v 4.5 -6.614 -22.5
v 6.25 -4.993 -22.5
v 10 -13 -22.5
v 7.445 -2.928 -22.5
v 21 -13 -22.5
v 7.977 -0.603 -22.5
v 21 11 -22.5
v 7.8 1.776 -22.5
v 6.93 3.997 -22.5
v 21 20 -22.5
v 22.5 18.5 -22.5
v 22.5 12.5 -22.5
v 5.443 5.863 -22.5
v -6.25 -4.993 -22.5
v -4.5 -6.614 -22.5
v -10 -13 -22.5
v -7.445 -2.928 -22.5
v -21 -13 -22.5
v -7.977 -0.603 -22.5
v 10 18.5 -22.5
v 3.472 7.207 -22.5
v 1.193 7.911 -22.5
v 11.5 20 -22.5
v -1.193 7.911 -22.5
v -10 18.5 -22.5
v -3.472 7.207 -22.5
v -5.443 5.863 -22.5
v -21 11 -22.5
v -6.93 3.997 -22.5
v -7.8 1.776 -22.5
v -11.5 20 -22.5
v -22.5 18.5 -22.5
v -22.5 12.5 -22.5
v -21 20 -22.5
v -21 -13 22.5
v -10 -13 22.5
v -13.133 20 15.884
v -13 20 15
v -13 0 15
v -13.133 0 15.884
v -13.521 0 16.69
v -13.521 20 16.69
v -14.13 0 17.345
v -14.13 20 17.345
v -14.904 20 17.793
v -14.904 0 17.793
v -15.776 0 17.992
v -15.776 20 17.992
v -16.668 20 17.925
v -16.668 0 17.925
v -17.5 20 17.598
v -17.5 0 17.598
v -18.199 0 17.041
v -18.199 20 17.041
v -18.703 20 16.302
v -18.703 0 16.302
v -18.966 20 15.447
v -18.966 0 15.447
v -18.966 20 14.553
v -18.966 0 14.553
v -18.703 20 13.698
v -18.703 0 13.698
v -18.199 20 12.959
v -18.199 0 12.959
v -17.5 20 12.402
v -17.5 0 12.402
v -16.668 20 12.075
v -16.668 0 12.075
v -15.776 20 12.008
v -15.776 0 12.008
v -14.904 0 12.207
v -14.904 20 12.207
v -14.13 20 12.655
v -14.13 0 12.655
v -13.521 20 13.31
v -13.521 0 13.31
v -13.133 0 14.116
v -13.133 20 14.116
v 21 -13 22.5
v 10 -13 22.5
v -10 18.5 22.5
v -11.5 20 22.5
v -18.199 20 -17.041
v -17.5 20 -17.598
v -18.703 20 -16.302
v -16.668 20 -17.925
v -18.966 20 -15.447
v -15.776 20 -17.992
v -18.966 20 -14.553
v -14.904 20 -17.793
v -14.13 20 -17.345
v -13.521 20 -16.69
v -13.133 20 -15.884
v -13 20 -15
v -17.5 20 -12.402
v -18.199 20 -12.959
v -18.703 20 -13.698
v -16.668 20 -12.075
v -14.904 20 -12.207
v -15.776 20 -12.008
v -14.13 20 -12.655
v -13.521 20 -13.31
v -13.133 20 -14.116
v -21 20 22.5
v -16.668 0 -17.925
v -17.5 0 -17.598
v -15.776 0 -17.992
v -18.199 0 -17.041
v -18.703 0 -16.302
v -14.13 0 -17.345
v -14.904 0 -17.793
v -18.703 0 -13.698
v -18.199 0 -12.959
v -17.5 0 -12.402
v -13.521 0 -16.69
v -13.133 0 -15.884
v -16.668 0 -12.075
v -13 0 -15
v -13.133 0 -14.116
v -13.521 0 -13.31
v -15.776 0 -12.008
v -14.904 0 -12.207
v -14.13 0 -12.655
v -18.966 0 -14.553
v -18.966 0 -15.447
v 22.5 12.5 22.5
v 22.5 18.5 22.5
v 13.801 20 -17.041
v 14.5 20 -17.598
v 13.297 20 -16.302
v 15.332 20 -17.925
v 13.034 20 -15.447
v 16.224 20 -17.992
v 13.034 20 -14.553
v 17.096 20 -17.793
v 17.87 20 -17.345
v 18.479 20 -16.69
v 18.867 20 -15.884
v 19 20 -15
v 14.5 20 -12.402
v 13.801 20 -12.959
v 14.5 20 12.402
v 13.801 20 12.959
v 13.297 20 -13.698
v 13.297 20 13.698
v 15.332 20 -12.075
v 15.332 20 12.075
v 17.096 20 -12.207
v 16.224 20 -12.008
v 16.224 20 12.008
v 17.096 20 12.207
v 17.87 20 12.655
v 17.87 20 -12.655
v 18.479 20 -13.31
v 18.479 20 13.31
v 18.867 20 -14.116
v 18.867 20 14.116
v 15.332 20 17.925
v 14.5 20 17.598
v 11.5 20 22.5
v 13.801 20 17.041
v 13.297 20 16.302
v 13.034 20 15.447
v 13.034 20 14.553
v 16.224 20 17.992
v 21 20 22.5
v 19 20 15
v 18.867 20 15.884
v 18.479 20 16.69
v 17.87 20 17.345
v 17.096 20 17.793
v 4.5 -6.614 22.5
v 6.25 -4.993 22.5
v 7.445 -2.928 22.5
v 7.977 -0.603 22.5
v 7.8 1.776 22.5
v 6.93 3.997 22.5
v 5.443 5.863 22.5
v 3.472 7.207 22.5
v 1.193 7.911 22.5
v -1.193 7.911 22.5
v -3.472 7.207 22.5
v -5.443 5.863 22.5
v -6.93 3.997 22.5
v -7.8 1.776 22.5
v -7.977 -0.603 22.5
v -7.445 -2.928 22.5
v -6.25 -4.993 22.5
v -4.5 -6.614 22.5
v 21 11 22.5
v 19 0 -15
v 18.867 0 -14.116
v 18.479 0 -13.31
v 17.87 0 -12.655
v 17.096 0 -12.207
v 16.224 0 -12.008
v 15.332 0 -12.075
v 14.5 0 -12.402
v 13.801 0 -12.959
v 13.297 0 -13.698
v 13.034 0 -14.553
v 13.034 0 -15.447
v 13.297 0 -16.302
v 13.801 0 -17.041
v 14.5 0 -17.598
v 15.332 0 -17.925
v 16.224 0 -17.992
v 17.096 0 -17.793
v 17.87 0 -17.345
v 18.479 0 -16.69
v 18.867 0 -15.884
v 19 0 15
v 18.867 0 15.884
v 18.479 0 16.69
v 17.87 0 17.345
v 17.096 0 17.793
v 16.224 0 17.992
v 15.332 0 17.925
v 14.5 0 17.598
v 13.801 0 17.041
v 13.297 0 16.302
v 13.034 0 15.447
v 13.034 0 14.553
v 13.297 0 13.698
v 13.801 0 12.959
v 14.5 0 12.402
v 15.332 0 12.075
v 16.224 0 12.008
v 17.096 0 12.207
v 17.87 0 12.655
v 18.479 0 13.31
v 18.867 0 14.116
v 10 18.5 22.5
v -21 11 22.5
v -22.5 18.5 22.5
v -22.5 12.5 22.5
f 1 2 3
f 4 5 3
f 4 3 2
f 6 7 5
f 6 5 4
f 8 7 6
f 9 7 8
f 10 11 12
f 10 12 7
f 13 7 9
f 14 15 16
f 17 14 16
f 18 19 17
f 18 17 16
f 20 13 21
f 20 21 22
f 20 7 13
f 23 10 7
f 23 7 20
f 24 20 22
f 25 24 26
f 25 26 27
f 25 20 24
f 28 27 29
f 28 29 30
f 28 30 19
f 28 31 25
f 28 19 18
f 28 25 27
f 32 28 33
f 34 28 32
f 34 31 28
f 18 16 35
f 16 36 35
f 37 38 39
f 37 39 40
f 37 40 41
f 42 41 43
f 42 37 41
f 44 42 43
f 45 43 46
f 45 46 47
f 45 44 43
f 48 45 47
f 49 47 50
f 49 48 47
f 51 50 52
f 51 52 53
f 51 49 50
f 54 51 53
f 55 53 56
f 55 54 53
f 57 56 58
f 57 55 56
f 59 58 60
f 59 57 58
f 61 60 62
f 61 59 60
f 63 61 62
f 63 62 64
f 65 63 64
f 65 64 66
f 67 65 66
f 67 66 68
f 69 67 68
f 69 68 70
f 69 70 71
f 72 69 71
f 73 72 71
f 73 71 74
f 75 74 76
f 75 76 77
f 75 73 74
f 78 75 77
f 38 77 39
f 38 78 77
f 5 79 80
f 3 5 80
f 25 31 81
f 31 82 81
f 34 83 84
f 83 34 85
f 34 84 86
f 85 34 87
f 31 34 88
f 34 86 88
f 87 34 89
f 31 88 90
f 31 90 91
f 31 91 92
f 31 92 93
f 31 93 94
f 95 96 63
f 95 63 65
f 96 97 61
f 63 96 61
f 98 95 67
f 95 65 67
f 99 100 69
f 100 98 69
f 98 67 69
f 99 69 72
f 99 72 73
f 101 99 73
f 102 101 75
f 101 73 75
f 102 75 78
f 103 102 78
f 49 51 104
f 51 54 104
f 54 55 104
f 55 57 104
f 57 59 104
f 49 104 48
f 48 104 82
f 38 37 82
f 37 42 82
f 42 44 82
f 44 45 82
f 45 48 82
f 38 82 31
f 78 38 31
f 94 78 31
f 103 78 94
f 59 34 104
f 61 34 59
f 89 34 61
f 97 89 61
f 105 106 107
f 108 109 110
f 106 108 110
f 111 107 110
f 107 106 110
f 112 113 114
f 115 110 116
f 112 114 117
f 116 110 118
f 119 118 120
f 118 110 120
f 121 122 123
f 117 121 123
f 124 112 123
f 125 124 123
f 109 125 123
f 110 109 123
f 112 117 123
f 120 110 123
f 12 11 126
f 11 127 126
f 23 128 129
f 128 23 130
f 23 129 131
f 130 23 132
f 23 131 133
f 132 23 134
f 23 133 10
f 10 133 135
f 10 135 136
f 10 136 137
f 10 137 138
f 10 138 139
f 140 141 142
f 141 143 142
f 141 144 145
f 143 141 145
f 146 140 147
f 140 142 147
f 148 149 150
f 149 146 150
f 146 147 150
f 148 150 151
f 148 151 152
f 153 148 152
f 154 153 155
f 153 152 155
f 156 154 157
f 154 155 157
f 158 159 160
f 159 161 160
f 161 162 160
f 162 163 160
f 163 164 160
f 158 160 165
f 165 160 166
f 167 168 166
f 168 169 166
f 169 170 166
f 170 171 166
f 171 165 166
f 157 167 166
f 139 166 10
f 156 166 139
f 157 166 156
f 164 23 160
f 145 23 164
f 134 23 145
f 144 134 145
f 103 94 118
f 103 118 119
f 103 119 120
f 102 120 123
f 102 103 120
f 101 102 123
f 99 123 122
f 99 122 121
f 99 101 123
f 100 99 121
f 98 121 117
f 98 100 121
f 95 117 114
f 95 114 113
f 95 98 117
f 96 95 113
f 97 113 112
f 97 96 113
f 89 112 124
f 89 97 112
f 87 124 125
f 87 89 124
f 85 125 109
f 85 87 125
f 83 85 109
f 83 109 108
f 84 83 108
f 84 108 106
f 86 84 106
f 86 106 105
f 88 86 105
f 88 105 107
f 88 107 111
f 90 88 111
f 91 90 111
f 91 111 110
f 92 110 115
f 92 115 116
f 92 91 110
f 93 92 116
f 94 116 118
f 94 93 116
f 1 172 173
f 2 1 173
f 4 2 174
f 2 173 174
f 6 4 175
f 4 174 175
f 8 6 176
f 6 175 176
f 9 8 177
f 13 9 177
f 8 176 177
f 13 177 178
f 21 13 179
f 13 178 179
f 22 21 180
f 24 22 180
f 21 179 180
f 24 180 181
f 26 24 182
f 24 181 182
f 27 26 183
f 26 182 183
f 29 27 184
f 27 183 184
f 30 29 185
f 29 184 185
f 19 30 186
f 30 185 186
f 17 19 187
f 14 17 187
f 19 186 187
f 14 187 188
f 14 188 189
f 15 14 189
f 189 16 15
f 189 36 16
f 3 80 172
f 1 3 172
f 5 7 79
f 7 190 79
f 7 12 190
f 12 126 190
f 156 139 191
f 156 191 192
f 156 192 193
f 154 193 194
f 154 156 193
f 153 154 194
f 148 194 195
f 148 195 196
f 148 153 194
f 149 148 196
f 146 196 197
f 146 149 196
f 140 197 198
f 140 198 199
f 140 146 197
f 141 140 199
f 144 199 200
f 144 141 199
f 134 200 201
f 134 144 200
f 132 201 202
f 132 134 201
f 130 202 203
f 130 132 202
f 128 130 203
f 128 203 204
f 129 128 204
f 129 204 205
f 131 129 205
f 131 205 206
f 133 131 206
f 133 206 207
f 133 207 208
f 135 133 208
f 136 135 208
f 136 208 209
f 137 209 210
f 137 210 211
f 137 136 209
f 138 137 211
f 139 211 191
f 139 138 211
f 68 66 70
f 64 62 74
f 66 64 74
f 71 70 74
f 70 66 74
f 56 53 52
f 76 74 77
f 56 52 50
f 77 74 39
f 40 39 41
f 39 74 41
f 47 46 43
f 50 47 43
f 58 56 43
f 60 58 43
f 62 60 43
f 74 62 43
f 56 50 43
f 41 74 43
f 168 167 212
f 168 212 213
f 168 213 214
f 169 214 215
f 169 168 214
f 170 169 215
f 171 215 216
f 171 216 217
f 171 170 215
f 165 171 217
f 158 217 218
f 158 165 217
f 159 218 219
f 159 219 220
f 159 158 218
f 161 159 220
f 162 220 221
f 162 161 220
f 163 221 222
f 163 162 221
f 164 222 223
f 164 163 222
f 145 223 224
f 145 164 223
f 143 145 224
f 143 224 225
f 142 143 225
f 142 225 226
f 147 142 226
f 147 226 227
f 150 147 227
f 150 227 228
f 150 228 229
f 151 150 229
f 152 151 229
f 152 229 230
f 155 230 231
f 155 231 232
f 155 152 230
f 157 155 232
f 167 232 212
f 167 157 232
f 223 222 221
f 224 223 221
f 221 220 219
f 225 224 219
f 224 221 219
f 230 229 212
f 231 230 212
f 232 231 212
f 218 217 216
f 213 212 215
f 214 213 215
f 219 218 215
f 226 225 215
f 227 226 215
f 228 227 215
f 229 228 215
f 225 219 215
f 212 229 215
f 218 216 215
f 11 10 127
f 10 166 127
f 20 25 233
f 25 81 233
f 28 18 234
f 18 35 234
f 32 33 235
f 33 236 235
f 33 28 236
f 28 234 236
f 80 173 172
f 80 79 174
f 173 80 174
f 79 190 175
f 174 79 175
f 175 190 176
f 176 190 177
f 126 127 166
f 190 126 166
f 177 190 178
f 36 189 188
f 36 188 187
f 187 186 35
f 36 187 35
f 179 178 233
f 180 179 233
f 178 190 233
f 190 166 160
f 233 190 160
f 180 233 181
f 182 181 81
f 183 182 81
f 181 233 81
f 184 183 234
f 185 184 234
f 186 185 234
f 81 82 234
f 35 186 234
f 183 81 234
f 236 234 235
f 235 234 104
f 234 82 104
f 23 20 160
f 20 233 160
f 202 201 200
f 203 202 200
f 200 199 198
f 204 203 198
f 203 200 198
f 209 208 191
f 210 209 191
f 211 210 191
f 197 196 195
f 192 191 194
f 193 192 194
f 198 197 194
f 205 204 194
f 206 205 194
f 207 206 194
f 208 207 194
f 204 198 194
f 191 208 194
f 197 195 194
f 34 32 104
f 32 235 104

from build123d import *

# Parameters (mm, degrees)
PAD_DEPTH    = 22.5
SKETCH001_R  = 3
POCKET_DEPTH = 20


with BuildPart() as part:
    # Sketch → Pad (new body, symmetric)
    with BuildSketch(Plane.XY):
        with BuildLine():
            ThreePointArc((4.5, -6.614378), (0, 8), (-4.5, -6.614378))
            Line((-10, -13), (-4.5, -6.614378))
            Line((-10, -13), (-21, -13))
            Line((-21, -13), (-21, 11))
            Line((-21, 11), (-22.5, 12.5))
            Line((-22.5, 12.5), (-22.5, 18.5))
            Line((-22.5, 18.5), (-21, 20))
            Line((-21, 20), (-11.5, 20))
            Line((-11.5, 20), (-10, 18.5))
            Line((-10, 18.5), (10, 18.5))
            Line((10, 18.5), (11.5, 20))
            Line((11.5, 20), (21, 20))
            Line((21, 20), (22.5, 18.5))
            Line((22.5, 18.5), (22.5, 12.5))
            Line((22.5, 12.5), (21, 11))
            Line((21, 11), (21, -13))
            Line((21, -13), (10, -13))
            Line((10, -13), (4.5, -6.614378))
        make_face()
    extrude(amount=PAD_DEPTH, both=True)

    # Sketch001 → Pocket (cut)
    with BuildSketch(Plane.XZ.offset(-20)):
        with Locations((-16, 15)):
            Circle(SKETCH001_R)
        with Locations((16, 15)):
            Circle(SKETCH001_R)
        with Locations((16, -15)):
            Circle(SKETCH001_R)
        with Locations((-16, -15)):
            Circle(SKETCH001_R)
    extrude(amount=POCKET_DEPTH, mode=Mode.SUBTRACT)


solid = part.part
